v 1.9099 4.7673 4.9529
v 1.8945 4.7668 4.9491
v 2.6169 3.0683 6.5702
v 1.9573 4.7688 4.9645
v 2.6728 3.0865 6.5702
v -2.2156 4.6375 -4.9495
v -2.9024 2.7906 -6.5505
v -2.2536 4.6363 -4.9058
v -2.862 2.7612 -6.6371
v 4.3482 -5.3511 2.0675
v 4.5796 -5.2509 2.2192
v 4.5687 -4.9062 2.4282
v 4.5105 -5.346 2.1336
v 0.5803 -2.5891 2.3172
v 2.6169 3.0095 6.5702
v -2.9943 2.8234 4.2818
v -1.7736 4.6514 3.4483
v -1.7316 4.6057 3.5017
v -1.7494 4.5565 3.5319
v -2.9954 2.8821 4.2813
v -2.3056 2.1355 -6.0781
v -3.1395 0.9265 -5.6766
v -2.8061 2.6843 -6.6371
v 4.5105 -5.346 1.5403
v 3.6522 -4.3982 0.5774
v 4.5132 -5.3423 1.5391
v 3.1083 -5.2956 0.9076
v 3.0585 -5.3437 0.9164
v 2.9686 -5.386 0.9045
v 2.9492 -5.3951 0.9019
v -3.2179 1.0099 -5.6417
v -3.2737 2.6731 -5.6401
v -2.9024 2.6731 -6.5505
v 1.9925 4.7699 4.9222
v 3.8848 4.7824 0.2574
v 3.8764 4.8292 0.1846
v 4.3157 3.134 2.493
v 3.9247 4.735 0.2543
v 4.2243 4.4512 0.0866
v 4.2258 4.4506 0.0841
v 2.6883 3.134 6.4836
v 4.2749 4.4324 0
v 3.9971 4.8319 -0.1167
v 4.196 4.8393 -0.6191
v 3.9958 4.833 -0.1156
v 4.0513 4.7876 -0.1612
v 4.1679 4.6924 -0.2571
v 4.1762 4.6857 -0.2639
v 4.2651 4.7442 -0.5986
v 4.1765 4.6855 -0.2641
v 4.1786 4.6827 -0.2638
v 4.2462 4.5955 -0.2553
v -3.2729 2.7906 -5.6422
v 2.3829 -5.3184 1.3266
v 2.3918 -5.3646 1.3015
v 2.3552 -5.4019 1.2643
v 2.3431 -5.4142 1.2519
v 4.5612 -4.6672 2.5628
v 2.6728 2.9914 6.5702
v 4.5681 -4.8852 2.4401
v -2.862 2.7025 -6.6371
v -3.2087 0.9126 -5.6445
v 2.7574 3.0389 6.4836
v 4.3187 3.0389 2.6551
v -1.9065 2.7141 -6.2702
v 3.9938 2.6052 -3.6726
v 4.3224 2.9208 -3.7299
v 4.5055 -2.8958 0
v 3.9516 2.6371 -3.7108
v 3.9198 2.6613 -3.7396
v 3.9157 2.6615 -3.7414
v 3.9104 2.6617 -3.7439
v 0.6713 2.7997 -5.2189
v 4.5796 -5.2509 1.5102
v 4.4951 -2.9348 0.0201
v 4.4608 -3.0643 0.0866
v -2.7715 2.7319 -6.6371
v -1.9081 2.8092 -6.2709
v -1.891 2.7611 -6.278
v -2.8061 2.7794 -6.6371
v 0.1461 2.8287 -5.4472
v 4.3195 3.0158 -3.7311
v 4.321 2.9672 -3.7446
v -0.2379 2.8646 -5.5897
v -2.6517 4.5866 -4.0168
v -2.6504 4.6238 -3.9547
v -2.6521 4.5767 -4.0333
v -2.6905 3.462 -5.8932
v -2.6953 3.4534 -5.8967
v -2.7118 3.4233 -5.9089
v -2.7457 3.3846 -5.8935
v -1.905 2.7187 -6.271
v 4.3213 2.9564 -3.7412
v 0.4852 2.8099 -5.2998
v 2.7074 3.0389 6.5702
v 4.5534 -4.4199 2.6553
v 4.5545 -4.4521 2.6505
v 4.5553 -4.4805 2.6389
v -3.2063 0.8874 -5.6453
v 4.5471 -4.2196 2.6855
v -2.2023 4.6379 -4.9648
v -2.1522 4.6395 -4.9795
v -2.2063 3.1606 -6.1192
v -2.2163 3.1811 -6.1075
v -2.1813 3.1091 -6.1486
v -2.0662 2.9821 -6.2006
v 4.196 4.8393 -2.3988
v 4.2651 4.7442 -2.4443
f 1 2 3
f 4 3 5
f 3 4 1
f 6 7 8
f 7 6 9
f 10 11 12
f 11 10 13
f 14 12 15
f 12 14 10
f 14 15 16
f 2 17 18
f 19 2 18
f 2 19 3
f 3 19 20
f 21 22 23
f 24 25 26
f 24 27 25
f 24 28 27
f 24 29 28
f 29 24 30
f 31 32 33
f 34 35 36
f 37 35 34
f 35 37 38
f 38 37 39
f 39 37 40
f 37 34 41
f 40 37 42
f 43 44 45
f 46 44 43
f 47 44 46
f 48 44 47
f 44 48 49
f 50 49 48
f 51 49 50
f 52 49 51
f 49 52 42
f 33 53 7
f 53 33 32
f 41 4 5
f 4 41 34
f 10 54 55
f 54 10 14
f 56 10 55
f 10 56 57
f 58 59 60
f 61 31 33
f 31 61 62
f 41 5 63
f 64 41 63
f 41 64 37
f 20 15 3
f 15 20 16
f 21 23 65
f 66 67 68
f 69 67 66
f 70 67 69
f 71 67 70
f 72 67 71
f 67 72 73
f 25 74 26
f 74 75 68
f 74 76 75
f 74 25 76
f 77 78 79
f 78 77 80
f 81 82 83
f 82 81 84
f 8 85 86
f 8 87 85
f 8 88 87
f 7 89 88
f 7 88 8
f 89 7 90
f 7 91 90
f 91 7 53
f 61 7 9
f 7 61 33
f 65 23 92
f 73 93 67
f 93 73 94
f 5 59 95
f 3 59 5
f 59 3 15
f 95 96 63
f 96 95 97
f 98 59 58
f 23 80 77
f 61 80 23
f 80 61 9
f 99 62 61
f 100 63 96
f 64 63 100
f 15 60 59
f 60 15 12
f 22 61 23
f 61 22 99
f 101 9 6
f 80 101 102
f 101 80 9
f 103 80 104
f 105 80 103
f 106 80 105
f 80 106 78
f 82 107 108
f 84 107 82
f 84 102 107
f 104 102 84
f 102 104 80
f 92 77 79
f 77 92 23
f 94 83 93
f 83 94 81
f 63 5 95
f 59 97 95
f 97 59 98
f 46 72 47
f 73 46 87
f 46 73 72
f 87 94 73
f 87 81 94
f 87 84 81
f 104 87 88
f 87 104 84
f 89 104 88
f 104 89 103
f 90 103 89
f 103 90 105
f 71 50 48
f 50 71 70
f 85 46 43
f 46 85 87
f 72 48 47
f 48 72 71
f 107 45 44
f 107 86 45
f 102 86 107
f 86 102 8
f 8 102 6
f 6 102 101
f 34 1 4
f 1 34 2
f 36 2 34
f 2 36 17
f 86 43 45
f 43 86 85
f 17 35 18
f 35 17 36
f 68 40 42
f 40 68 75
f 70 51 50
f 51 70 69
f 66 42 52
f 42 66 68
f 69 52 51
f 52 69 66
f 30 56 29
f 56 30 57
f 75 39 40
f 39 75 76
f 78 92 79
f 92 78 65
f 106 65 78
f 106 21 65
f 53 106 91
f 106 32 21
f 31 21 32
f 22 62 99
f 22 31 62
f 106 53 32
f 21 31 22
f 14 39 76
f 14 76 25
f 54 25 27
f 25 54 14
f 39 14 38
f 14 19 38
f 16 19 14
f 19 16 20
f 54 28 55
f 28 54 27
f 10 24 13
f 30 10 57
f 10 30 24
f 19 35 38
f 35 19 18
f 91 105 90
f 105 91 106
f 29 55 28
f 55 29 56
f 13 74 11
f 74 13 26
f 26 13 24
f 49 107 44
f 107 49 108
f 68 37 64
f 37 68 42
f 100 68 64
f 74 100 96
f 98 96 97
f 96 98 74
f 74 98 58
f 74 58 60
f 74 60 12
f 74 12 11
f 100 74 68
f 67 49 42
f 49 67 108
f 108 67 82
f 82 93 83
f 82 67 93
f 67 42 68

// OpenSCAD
// Auto-generated OpenSCAD file

    inner_points = 10*[[0.4479590588990513, -0.5250898206093074, -7.05324687544362e-13], [0.4165075656405067, 0.4744154588023662, 2.0339285811132868e-13], [-0.417637904288353, -0.5523276127577147, -0.5000000000003288], [-0.44908939754689753, 0.44717766665395897, -0.49999999999942013], [-0.41763790428788994, -0.5523276127586092, 0.49999999999967115], [-0.44908939754643434, 0.44717766665306447, 0.5000000000005798], [0.352813311127668, -0.027836294896346484, -0.862372435696011]];

    outer_points = 10*[[0.26573559772755095, 0.3038927930034916, 0.6483572285355131], [-0.6597836115012342, 0.2731852040296694, 0.2709036057844004], [0.6433673075177818, 0.3038927930034916, -0.27759865149382545], [-0.28215190171100324, 0.2731852040296694, -0.6550522742449382], [0.47917590859784487, -0.5617242025462499, 0.1954218570849814], [-0.4463433006309402, -0.5924317915200721, -0.18203176566613136], [-0.028313936102664725, 0.9953123157758751, -0.01154724575106305]];

    // Convex hull for inner set (I)
    module inner_hull() {
        hull() {
            for (p = inner_points) {
                translate(p) sphere(r=0.1);
            }
        }
    }

    // Convex hull for outer set (O) minus inner hull (O \ I)
    module outer_minus_inner() {
        difference() {
            hull() {
                for (p = outer_points) {
                    translate(p) sphere(r=0.1);
                }
            }
            inner_hull(); // Subtract inner hull
        }
    }

    // Convex hull for outer set (O) minus all translated inner hulls
    module outer_minus_AllTranslationInner() {
        difference() {
            hull() {
                for (p = outer_points) {
                    translate(p) sphere(r=0.1);
                }
            }
            hull() {
                translate([0,0,50]) inner_hull();
                translate([0,0,-50]) inner_hull();
            }; // Subtract translated inner hulls
        }
    }

    // Difference between outer_minus_inner and outer_minus_AllTranslationInner
    module outer_minus_inner_diff() {
        difference() {
            // Outer minus inner
            difference() {
                hull() {
                    for (p = outer_points) {
                        translate(p) sphere(r=0.1);
                    }
                }
                inner_hull();
            }

            // Subtract Outer minus AllTranslationInner
            difference() {
                hull() {
                    for (p = outer_points) {
                        translate(p) sphere(r=0.1);
                    }
                }
                hull() {
                    translate([0,0,50]) inner_hull();
                    translate([0,0,-50]) inner_hull();
                };
            }
        }
    }

    // Rendering all with colors applied
    color([1, 1, 0, 1]) outer_minus_inner_diff(); // Opaque yellow
    
